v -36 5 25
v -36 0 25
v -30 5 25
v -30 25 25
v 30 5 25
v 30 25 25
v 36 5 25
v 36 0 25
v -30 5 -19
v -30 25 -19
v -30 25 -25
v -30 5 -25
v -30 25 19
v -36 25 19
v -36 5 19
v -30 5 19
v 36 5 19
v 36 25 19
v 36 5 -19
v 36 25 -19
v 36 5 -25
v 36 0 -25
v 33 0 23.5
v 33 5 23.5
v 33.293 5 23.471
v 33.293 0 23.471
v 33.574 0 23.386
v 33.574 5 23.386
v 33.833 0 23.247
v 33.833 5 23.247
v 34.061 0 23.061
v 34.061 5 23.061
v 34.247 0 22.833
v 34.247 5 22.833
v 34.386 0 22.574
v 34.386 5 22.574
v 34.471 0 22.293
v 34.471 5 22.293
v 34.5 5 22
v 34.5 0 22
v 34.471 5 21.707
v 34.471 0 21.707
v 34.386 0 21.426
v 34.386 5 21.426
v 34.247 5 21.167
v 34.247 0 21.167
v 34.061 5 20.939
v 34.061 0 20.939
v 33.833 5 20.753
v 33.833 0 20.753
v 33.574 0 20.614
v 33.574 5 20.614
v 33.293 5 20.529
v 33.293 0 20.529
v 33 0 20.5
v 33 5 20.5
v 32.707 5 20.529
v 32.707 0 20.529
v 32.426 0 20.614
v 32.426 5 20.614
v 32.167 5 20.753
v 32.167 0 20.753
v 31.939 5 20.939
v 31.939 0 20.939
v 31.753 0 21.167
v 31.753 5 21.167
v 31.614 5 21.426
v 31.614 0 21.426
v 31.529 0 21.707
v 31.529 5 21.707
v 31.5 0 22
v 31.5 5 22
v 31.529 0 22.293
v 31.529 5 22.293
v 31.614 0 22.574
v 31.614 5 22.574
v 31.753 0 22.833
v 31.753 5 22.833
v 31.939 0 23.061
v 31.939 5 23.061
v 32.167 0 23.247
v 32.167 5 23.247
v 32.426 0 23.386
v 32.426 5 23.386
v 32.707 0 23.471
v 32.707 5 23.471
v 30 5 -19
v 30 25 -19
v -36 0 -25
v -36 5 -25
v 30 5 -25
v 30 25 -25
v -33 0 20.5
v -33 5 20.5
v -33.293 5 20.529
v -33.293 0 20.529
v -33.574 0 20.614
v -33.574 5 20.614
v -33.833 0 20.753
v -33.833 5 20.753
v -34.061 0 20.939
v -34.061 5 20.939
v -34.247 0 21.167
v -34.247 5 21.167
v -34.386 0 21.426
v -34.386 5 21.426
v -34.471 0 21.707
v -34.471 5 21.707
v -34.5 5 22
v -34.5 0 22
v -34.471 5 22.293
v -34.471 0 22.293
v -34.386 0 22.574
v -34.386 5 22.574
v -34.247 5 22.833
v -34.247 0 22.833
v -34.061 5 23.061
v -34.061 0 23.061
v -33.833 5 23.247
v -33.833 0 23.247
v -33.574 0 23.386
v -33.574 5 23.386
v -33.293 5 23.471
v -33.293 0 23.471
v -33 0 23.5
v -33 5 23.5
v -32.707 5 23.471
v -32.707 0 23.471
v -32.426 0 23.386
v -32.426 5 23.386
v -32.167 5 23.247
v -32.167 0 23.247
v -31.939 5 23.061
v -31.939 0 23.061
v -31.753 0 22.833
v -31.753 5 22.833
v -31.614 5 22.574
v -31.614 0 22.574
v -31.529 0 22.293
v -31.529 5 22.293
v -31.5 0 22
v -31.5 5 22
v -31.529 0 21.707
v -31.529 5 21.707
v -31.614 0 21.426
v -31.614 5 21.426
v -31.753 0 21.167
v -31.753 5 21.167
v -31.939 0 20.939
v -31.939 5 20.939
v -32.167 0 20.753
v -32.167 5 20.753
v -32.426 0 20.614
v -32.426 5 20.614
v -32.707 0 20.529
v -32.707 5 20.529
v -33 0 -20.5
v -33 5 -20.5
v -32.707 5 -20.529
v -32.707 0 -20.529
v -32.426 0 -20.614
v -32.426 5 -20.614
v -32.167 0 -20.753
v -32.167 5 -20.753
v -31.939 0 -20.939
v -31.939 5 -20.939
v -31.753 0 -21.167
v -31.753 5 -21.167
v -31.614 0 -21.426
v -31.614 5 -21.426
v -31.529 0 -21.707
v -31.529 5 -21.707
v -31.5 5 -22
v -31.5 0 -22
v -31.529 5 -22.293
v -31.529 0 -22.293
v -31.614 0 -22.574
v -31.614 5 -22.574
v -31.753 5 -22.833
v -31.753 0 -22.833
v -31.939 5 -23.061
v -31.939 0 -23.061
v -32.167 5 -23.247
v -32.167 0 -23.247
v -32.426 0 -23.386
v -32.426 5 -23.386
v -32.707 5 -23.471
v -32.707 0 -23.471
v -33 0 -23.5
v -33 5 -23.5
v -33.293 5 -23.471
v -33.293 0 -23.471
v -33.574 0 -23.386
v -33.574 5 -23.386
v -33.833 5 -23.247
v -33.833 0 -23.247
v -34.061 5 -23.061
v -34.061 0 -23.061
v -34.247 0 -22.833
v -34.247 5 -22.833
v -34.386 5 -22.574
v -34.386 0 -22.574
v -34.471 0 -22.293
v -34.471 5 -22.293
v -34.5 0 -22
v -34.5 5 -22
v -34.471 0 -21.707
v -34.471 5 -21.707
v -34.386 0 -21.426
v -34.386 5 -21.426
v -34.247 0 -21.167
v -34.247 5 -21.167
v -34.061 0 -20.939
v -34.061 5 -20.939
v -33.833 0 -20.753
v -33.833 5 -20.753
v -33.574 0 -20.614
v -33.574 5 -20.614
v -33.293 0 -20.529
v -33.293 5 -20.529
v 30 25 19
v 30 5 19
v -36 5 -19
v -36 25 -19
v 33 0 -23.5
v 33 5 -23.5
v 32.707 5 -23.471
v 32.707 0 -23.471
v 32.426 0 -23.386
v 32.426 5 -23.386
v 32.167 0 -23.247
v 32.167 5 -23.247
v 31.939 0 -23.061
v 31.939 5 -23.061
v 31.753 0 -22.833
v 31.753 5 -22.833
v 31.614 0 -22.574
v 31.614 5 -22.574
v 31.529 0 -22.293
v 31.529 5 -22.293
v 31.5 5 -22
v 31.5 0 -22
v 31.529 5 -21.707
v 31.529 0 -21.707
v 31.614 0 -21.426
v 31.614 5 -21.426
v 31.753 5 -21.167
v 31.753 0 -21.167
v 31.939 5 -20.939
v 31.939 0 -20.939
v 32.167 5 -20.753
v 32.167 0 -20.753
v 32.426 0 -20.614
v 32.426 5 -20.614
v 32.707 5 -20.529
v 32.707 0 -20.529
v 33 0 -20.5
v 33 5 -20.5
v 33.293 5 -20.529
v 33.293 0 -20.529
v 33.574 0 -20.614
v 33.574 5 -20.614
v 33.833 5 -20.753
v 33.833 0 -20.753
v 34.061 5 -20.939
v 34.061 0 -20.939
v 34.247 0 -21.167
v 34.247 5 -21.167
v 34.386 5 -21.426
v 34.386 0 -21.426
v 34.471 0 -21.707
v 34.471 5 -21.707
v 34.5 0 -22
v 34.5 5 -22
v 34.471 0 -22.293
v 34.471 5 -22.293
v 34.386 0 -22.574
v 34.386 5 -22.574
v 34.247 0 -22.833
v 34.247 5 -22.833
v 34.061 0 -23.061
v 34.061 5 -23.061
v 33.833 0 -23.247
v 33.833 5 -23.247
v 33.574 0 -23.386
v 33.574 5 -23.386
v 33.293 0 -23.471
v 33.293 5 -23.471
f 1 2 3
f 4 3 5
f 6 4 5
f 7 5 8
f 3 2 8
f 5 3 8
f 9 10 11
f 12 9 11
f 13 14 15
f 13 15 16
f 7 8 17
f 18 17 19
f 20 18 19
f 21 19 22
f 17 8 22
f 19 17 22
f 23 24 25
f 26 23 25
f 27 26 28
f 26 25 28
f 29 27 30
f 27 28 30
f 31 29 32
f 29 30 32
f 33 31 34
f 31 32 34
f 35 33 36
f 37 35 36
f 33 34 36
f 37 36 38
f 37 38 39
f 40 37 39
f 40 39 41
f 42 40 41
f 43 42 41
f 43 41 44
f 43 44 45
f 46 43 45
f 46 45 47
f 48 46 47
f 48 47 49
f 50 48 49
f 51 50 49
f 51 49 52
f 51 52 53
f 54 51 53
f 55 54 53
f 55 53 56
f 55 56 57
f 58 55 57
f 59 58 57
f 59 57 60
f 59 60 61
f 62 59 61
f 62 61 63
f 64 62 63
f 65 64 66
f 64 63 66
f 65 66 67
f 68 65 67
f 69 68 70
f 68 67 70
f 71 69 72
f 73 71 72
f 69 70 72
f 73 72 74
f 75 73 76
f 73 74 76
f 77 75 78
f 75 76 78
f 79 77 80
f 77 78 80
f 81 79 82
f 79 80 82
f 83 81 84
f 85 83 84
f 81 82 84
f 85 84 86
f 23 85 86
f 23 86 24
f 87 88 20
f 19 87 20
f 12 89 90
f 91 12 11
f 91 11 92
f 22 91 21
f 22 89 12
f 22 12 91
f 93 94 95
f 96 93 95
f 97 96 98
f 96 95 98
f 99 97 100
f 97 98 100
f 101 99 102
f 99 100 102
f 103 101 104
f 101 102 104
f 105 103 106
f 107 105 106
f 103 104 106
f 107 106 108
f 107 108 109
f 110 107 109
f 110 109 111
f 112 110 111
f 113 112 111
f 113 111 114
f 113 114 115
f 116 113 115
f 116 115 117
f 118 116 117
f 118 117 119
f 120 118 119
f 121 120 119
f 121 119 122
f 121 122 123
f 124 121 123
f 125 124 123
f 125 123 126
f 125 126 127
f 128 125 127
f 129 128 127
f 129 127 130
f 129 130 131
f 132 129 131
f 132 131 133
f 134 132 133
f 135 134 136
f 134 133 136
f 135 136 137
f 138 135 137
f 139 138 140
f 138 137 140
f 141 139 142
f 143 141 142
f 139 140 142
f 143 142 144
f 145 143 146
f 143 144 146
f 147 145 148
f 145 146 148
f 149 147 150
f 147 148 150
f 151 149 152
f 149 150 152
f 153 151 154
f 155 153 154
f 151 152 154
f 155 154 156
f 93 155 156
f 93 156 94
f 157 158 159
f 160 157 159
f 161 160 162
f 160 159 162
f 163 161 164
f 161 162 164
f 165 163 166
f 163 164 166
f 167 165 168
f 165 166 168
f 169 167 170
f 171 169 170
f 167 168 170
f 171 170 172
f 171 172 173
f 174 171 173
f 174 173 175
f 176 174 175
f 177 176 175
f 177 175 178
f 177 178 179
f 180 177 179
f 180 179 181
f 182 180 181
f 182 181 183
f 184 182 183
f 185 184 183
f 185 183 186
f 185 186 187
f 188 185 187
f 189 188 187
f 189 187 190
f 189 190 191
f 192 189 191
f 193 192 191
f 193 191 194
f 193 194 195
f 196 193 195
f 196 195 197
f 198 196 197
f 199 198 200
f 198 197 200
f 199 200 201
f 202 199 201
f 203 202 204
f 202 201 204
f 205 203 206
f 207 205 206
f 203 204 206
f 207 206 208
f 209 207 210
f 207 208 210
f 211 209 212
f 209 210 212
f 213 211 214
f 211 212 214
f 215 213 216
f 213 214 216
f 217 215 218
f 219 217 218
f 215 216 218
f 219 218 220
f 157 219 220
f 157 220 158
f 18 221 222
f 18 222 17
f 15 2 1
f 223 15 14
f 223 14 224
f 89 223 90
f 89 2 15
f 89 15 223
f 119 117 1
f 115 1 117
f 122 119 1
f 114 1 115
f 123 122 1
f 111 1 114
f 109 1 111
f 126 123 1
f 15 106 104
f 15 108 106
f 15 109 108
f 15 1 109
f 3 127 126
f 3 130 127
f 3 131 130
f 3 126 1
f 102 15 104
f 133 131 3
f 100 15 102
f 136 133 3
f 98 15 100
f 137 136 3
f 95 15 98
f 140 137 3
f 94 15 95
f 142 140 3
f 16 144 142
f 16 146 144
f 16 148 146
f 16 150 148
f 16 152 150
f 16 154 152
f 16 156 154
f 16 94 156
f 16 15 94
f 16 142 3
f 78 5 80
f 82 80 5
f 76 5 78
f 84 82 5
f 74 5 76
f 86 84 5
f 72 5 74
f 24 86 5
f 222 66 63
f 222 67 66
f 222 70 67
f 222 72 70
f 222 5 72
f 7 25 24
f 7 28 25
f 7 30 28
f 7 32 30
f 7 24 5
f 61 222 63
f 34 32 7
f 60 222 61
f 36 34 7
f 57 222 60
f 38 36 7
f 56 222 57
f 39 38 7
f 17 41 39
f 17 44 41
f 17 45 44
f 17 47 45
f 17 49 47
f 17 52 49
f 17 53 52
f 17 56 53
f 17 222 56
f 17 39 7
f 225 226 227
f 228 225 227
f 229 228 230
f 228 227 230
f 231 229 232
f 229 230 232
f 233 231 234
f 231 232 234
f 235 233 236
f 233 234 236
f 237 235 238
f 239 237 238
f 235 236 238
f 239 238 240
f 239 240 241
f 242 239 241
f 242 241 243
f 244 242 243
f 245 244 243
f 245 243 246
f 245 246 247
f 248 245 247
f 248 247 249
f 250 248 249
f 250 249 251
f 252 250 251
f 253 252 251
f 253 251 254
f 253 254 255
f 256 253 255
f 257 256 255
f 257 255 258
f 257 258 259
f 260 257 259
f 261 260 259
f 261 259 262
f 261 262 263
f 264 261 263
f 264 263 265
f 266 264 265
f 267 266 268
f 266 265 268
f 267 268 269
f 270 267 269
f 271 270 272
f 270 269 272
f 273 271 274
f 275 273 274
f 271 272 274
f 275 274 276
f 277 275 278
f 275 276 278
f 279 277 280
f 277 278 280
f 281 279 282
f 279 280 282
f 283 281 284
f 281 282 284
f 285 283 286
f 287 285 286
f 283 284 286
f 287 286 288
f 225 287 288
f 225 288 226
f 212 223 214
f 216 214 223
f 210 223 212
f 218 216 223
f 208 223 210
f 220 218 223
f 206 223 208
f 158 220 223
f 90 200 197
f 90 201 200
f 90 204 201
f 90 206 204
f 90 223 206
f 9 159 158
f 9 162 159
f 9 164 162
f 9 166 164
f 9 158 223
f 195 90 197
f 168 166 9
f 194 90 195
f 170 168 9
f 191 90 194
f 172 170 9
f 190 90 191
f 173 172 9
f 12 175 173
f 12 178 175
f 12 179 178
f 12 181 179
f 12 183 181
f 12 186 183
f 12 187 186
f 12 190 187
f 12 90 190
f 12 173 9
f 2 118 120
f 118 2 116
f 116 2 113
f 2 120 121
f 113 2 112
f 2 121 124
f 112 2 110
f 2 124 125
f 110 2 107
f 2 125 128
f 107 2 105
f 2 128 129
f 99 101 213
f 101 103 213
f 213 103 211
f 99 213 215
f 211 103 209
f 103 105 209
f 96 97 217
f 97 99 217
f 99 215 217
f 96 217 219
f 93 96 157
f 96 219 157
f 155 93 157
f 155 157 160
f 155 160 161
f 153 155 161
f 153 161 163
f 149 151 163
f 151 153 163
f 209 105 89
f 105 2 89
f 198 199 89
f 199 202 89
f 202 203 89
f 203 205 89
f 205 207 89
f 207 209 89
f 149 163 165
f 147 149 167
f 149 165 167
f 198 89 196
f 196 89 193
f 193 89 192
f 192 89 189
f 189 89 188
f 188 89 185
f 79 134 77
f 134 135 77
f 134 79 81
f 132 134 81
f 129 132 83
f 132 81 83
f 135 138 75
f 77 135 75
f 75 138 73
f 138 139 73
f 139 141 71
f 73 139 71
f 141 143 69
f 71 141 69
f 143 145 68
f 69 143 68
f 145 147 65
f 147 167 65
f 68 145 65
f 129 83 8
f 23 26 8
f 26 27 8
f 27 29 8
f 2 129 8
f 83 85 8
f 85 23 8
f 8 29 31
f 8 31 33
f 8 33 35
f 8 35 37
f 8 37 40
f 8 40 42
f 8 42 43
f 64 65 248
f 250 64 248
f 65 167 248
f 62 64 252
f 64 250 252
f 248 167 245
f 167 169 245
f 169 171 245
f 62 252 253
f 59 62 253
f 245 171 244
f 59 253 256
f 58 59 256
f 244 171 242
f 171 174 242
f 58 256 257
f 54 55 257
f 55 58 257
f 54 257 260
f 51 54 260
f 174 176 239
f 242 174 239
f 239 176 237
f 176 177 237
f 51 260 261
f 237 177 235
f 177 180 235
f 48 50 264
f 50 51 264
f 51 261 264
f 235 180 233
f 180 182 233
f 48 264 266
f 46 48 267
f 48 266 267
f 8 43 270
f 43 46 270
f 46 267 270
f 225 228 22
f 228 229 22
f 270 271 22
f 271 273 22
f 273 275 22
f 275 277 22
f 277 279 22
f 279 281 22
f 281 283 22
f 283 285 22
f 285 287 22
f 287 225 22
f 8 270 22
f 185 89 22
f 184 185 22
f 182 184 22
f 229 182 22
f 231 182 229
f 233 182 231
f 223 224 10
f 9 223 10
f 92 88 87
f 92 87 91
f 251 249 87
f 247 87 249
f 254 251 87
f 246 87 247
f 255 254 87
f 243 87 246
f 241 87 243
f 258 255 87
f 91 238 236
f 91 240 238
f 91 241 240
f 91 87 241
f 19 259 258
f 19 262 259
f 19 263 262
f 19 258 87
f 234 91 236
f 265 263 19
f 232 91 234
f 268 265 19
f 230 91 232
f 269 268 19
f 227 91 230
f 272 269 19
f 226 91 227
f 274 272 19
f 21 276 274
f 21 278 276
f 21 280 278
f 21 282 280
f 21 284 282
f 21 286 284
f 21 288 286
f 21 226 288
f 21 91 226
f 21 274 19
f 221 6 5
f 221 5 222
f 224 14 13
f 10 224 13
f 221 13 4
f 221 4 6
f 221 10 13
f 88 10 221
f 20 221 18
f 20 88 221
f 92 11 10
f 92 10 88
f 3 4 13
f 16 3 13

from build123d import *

# Parameters (mm, degrees)
SKETCH_1_W          = 72
SKETCH_1_H          = 50
EXTRUDE_1_DEPTH     = 25
SKETCH_3_R          = 1.5
CUT_EXTRUDE_1_DEPTH = 51.457903246
SKETCH_4_W          = 6
SKETCH_4_H          = 6
CUT_EXTRUDE_2_DEPTH = 20


with BuildPart() as part:
    # 草图1 → 凸台-拉伸1 (new body)
    with BuildSketch(Plane(origin=(0, 0, 0), x_dir=(1, 0, 0), z_dir=(0, 1, 0))):
        Rectangle(SKETCH_1_W, SKETCH_1_H)
    extrude(amount=EXTRUDE_1_DEPTH)

    # 草图3 → 切除-拉伸1 (cut, through all)
    with BuildSketch(Plane(origin=(0, 25, 0), x_dir=(1, 0, 0), z_dir=(0, 1, 0))):
        with Locations(Location((-33, 22, 0), (0, 0, 270))):
            Circle(SKETCH_3_R)
        with Locations(Location((33, 22, 0), (0, 0, 90))):
            Circle(SKETCH_3_R)
        with Locations(Location((33, -22, 0), (0, 0, 270))):
            Circle(SKETCH_3_R)
        with Locations(Location((-33, -22, 0), (0, 0, 90))):
            Circle(SKETCH_3_R)
    extrude(amount=-CUT_EXTRUDE_1_DEPTH, mode=Mode.SUBTRACT)

    # 草图4 → 切除-拉伸2 (cut)
    with BuildSketch(Plane(origin=(0, 25, 0), x_dir=(1, 0, 0), z_dir=(0, 1, 0))):
        with Locations((-33, 22)):
            Rectangle(SKETCH_4_W, SKETCH_4_H)
        with Locations((33, 22)):
            Rectangle(SKETCH_4_W, SKETCH_4_H)
        with Locations((33, -22)):
            Rectangle(SKETCH_4_W, SKETCH_4_H)
        with Locations((-33, -22)):
            Rectangle(SKETCH_4_W, SKETCH_4_H)
    extrude(amount=-CUT_EXTRUDE_2_DEPTH, mode=Mode.SUBTRACT)


solid = part.part
